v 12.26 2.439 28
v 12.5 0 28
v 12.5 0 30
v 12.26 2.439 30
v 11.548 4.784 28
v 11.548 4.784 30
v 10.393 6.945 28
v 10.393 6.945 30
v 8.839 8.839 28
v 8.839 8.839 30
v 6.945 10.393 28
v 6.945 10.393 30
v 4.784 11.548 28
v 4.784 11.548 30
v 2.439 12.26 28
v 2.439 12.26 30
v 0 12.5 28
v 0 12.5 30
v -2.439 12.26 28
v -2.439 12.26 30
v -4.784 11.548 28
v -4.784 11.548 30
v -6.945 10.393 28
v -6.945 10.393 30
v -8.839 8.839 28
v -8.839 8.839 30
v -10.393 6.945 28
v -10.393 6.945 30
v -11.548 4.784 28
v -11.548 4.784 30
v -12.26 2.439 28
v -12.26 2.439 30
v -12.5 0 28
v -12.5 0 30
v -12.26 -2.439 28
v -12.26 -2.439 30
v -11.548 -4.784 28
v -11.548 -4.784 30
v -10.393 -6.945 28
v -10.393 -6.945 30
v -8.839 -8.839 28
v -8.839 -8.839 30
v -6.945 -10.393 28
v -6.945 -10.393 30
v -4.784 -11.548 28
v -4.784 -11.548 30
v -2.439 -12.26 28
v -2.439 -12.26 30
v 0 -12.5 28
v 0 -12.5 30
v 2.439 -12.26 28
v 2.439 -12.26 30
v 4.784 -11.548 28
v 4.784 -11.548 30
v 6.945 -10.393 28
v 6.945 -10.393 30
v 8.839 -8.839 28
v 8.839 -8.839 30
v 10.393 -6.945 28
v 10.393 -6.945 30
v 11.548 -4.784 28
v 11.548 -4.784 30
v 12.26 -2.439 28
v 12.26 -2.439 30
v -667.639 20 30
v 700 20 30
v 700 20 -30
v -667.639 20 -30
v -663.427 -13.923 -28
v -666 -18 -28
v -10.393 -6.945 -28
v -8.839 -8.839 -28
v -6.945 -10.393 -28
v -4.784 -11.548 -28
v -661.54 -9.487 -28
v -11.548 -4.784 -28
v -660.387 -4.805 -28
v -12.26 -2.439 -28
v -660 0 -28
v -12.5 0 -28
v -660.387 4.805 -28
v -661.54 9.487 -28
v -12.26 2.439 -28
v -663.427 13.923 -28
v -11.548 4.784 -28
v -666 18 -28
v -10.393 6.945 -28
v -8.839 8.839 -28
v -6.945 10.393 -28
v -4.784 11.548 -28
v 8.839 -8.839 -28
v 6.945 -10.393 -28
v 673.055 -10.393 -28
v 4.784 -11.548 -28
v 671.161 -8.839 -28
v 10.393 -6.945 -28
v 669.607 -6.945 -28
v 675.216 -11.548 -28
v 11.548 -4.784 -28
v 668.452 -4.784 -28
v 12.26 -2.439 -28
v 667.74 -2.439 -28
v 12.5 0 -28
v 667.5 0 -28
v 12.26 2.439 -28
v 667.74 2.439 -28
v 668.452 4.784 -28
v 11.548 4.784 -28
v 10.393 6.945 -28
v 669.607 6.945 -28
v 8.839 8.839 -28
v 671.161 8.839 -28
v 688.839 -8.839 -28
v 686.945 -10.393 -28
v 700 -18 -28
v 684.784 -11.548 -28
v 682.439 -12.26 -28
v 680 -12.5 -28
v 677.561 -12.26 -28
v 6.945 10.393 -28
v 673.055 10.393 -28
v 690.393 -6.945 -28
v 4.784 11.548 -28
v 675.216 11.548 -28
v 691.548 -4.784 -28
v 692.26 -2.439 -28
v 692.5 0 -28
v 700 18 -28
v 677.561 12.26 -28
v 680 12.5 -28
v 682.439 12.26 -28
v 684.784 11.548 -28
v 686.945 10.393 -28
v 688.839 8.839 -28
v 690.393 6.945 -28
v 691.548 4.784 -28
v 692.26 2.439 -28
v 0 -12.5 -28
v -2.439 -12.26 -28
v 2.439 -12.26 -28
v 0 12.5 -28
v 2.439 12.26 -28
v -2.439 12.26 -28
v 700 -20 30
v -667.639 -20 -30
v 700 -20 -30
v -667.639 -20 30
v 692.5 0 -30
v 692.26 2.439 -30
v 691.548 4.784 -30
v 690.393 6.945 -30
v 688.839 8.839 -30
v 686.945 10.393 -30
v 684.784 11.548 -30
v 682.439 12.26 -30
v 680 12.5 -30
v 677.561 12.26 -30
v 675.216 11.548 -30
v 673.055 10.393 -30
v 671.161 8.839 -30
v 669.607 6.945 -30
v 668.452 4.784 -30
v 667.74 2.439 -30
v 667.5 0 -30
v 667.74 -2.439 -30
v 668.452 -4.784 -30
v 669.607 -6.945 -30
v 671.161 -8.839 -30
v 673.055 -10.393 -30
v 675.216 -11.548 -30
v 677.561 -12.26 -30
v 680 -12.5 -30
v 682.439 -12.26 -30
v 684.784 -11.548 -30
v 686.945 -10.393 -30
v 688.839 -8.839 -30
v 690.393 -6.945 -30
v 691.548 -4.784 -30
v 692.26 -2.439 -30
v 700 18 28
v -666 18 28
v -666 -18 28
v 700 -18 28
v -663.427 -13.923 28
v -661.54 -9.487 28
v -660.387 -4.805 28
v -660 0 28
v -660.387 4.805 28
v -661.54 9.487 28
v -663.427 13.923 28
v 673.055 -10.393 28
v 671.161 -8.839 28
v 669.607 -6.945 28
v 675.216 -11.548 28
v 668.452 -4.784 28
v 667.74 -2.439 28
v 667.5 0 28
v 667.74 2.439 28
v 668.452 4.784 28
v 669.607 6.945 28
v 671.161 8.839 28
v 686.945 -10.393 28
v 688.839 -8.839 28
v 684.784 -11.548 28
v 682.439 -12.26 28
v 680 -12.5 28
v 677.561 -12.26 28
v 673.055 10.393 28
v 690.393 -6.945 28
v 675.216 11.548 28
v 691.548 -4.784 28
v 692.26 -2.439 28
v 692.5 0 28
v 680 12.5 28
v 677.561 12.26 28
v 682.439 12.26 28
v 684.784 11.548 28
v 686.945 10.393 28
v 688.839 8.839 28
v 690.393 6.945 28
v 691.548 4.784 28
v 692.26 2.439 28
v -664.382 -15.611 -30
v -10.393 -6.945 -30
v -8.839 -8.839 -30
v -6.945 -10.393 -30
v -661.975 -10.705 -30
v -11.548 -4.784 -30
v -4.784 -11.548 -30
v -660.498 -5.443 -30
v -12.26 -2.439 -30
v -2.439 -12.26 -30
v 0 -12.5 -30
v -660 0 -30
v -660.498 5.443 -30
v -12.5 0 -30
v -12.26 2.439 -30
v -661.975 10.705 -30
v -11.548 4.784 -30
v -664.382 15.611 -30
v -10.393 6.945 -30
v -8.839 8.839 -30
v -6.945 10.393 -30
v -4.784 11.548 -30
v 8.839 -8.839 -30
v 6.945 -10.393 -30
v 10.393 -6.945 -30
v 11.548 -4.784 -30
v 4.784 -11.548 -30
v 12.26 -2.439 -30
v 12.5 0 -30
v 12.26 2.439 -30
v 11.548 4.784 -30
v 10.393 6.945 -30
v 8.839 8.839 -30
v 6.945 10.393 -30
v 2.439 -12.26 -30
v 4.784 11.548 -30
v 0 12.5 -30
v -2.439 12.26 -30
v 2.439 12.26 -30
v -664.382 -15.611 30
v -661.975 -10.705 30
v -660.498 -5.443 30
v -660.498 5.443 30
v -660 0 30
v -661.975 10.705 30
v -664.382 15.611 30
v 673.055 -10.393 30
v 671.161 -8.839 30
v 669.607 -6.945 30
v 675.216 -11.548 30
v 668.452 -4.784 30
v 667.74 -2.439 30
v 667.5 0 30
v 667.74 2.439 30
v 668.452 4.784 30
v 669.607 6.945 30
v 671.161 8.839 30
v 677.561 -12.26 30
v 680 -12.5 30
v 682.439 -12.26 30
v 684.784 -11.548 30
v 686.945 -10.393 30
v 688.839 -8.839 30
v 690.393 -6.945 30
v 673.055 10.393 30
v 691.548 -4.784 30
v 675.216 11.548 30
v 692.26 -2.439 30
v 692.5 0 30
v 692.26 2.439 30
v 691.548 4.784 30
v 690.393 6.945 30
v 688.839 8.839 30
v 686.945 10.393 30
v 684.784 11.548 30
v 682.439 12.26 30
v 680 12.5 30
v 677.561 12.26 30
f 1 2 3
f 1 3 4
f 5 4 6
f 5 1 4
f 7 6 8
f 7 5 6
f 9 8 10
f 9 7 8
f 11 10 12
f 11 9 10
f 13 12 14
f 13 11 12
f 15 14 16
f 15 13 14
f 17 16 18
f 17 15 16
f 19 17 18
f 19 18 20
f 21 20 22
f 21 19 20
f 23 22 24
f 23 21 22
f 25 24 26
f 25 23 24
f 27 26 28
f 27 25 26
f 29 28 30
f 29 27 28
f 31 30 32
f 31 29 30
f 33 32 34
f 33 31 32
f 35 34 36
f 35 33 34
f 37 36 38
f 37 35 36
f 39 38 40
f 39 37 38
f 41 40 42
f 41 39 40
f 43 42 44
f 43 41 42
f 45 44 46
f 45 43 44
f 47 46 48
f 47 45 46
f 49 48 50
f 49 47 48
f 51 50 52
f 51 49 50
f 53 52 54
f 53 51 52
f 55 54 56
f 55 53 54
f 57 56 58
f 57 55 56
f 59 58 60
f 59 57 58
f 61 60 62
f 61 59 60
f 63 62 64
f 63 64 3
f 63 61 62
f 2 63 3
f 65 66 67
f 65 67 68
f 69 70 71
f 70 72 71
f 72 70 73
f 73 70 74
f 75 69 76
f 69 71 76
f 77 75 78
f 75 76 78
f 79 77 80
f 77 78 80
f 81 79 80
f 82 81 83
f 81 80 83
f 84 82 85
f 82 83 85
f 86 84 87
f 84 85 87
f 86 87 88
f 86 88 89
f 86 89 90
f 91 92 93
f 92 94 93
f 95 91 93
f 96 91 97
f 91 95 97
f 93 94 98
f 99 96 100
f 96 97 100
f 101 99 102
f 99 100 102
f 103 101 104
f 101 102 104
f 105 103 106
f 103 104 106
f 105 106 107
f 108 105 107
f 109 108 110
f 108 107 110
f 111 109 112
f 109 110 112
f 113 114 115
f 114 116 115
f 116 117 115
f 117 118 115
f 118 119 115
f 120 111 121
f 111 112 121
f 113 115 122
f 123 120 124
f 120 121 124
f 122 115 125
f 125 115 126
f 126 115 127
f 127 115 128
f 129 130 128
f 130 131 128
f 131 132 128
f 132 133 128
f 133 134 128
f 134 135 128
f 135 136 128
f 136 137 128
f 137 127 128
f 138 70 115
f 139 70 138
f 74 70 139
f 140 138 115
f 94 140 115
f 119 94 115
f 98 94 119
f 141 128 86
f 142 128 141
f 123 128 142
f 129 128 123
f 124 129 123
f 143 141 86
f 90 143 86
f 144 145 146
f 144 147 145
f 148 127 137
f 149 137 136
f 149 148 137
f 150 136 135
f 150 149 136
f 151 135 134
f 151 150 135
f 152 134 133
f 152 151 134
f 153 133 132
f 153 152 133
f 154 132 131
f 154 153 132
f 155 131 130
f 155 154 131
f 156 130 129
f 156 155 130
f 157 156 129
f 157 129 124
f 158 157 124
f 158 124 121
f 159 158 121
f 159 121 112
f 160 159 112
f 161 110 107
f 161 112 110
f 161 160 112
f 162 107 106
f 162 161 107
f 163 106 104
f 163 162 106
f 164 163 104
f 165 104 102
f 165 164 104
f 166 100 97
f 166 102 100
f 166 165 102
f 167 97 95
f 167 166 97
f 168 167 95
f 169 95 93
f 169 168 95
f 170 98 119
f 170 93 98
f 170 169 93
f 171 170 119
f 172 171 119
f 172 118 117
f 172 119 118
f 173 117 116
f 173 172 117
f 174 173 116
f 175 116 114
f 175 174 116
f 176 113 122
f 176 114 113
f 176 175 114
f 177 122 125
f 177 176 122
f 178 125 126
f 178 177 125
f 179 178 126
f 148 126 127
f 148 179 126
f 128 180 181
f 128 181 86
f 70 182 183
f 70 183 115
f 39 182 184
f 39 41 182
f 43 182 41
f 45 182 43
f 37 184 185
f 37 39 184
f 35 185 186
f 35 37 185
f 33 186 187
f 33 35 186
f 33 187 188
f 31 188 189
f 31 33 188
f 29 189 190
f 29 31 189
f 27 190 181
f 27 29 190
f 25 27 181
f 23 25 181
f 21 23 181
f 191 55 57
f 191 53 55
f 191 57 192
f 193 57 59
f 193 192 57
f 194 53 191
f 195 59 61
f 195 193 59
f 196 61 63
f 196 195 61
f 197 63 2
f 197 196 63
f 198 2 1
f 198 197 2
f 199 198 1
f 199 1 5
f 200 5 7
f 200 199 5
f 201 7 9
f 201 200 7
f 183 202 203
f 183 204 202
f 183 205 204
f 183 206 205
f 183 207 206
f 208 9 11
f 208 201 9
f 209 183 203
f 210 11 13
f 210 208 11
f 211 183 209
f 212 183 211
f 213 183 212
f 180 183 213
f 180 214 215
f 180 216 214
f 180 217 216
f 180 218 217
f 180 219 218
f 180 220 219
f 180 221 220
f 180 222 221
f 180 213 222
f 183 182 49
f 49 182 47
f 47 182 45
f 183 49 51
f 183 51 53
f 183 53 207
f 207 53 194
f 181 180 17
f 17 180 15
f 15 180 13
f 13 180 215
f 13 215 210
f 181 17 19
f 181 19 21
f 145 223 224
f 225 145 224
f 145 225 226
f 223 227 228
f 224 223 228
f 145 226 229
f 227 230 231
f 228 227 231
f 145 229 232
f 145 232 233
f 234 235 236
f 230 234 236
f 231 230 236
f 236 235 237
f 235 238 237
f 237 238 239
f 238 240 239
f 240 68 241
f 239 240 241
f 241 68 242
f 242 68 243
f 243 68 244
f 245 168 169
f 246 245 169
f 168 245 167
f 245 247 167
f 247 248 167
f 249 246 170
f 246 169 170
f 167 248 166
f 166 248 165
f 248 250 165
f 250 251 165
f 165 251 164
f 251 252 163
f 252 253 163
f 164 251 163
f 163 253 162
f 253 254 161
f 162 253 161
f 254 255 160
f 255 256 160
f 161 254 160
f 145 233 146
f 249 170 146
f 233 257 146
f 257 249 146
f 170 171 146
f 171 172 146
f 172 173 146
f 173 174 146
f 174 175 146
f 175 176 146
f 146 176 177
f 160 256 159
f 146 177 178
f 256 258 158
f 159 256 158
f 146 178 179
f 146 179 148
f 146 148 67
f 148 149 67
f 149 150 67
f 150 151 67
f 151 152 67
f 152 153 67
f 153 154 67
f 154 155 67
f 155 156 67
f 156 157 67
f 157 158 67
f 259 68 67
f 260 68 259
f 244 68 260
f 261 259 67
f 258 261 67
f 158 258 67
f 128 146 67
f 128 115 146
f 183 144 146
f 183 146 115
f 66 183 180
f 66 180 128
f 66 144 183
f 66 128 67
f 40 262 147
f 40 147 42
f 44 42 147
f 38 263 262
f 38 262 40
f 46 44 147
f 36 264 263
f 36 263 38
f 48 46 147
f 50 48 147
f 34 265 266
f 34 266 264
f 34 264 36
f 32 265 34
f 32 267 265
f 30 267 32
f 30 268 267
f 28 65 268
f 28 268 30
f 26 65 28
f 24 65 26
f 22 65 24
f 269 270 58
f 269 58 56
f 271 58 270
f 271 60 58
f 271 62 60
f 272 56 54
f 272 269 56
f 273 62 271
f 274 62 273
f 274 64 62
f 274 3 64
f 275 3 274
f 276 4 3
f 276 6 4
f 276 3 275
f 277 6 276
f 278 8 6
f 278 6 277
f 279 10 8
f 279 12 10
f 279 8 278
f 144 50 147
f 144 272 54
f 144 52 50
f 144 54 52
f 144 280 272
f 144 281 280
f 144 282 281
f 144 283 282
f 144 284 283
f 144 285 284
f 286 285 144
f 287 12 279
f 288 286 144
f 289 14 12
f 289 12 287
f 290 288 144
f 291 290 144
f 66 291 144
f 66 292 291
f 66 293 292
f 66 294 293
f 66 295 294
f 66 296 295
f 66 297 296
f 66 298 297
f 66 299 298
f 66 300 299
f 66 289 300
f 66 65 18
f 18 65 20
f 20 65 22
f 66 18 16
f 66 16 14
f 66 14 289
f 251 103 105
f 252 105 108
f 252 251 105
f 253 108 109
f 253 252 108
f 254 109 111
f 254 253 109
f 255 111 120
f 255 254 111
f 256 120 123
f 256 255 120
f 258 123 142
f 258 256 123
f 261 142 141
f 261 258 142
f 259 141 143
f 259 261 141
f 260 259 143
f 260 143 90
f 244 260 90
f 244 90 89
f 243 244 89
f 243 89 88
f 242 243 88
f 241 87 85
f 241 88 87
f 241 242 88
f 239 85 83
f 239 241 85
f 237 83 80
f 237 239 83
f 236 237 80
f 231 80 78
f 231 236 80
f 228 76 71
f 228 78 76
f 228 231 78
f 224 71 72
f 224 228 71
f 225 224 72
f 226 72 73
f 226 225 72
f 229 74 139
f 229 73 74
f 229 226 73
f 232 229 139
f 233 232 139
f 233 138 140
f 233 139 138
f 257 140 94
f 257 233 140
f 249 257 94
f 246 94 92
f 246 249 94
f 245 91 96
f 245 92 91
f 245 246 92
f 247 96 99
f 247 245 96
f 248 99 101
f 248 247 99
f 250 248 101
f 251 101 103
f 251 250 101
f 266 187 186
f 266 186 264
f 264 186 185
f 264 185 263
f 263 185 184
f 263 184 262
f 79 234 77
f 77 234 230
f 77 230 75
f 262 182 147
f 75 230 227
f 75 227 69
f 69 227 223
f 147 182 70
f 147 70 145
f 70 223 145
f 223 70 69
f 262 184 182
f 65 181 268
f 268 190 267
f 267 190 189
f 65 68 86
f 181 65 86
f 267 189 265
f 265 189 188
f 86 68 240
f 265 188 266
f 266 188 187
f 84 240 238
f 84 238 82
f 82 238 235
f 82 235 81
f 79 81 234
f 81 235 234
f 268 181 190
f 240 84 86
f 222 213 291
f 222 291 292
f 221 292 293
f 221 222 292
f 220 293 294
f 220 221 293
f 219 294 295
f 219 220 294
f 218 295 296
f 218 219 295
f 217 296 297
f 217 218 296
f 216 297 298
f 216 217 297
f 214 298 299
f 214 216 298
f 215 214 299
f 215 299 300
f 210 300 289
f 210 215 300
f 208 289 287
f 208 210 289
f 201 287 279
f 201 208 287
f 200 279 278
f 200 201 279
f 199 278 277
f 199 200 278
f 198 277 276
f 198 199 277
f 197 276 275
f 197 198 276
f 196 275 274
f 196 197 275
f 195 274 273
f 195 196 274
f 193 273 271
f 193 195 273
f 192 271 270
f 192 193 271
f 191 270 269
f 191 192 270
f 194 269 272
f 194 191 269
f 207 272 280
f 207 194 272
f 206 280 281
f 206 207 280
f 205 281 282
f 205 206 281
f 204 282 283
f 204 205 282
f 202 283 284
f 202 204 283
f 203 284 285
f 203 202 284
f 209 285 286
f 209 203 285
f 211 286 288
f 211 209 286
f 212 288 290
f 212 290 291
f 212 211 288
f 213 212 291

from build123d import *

# Parameters (mm, degrees)
SKETCH1_R           = 12.5
BOSS_EXTRUDE1_DEPTH = 30
SKETCH2_W           = 56
SKETCH2_H           = 36
CUT_EXTRUDE1_DEPTH  = 1368.639320225


with BuildPart() as part:
    # Sketch1 → Boss-Extrude1 (new body, symmetric)
    with BuildSketch(Plane.XY):
        with BuildLine():
            Line((700, -20), (700, 20))
            Line((700, 20), (-667.639320225, 20))
            ThreePointArc((-667.639320225, 20), (-661.974829231, 10.704662693), (-660, 0))
            ThreePointArc((-660, 0), (-661.974829231, -10.704662693), (-667.639320225, -20))
            Line((-667.639320225, -20), (700, -20))
        make_face()
        Circle(SKETCH1_R, mode=Mode.SUBTRACT)
        with Locations((680, 0)):
            Circle(SKETCH1_R, mode=Mode.SUBTRACT)
    extrude(amount=BOSS_EXTRUDE1_DEPTH, both=True)

    # Sketch2 → Cut-Extrude1 (cut, through all)
    with BuildSketch(Plane(origin=(700, 0, 0), x_dir=(0, 0, -1), z_dir=(1, 0, 0))):
        Rectangle(SKETCH2_W, SKETCH2_H)
    extrude(amount=-CUT_EXTRUDE1_DEPTH, mode=Mode.SUBTRACT)


solid = part.part
